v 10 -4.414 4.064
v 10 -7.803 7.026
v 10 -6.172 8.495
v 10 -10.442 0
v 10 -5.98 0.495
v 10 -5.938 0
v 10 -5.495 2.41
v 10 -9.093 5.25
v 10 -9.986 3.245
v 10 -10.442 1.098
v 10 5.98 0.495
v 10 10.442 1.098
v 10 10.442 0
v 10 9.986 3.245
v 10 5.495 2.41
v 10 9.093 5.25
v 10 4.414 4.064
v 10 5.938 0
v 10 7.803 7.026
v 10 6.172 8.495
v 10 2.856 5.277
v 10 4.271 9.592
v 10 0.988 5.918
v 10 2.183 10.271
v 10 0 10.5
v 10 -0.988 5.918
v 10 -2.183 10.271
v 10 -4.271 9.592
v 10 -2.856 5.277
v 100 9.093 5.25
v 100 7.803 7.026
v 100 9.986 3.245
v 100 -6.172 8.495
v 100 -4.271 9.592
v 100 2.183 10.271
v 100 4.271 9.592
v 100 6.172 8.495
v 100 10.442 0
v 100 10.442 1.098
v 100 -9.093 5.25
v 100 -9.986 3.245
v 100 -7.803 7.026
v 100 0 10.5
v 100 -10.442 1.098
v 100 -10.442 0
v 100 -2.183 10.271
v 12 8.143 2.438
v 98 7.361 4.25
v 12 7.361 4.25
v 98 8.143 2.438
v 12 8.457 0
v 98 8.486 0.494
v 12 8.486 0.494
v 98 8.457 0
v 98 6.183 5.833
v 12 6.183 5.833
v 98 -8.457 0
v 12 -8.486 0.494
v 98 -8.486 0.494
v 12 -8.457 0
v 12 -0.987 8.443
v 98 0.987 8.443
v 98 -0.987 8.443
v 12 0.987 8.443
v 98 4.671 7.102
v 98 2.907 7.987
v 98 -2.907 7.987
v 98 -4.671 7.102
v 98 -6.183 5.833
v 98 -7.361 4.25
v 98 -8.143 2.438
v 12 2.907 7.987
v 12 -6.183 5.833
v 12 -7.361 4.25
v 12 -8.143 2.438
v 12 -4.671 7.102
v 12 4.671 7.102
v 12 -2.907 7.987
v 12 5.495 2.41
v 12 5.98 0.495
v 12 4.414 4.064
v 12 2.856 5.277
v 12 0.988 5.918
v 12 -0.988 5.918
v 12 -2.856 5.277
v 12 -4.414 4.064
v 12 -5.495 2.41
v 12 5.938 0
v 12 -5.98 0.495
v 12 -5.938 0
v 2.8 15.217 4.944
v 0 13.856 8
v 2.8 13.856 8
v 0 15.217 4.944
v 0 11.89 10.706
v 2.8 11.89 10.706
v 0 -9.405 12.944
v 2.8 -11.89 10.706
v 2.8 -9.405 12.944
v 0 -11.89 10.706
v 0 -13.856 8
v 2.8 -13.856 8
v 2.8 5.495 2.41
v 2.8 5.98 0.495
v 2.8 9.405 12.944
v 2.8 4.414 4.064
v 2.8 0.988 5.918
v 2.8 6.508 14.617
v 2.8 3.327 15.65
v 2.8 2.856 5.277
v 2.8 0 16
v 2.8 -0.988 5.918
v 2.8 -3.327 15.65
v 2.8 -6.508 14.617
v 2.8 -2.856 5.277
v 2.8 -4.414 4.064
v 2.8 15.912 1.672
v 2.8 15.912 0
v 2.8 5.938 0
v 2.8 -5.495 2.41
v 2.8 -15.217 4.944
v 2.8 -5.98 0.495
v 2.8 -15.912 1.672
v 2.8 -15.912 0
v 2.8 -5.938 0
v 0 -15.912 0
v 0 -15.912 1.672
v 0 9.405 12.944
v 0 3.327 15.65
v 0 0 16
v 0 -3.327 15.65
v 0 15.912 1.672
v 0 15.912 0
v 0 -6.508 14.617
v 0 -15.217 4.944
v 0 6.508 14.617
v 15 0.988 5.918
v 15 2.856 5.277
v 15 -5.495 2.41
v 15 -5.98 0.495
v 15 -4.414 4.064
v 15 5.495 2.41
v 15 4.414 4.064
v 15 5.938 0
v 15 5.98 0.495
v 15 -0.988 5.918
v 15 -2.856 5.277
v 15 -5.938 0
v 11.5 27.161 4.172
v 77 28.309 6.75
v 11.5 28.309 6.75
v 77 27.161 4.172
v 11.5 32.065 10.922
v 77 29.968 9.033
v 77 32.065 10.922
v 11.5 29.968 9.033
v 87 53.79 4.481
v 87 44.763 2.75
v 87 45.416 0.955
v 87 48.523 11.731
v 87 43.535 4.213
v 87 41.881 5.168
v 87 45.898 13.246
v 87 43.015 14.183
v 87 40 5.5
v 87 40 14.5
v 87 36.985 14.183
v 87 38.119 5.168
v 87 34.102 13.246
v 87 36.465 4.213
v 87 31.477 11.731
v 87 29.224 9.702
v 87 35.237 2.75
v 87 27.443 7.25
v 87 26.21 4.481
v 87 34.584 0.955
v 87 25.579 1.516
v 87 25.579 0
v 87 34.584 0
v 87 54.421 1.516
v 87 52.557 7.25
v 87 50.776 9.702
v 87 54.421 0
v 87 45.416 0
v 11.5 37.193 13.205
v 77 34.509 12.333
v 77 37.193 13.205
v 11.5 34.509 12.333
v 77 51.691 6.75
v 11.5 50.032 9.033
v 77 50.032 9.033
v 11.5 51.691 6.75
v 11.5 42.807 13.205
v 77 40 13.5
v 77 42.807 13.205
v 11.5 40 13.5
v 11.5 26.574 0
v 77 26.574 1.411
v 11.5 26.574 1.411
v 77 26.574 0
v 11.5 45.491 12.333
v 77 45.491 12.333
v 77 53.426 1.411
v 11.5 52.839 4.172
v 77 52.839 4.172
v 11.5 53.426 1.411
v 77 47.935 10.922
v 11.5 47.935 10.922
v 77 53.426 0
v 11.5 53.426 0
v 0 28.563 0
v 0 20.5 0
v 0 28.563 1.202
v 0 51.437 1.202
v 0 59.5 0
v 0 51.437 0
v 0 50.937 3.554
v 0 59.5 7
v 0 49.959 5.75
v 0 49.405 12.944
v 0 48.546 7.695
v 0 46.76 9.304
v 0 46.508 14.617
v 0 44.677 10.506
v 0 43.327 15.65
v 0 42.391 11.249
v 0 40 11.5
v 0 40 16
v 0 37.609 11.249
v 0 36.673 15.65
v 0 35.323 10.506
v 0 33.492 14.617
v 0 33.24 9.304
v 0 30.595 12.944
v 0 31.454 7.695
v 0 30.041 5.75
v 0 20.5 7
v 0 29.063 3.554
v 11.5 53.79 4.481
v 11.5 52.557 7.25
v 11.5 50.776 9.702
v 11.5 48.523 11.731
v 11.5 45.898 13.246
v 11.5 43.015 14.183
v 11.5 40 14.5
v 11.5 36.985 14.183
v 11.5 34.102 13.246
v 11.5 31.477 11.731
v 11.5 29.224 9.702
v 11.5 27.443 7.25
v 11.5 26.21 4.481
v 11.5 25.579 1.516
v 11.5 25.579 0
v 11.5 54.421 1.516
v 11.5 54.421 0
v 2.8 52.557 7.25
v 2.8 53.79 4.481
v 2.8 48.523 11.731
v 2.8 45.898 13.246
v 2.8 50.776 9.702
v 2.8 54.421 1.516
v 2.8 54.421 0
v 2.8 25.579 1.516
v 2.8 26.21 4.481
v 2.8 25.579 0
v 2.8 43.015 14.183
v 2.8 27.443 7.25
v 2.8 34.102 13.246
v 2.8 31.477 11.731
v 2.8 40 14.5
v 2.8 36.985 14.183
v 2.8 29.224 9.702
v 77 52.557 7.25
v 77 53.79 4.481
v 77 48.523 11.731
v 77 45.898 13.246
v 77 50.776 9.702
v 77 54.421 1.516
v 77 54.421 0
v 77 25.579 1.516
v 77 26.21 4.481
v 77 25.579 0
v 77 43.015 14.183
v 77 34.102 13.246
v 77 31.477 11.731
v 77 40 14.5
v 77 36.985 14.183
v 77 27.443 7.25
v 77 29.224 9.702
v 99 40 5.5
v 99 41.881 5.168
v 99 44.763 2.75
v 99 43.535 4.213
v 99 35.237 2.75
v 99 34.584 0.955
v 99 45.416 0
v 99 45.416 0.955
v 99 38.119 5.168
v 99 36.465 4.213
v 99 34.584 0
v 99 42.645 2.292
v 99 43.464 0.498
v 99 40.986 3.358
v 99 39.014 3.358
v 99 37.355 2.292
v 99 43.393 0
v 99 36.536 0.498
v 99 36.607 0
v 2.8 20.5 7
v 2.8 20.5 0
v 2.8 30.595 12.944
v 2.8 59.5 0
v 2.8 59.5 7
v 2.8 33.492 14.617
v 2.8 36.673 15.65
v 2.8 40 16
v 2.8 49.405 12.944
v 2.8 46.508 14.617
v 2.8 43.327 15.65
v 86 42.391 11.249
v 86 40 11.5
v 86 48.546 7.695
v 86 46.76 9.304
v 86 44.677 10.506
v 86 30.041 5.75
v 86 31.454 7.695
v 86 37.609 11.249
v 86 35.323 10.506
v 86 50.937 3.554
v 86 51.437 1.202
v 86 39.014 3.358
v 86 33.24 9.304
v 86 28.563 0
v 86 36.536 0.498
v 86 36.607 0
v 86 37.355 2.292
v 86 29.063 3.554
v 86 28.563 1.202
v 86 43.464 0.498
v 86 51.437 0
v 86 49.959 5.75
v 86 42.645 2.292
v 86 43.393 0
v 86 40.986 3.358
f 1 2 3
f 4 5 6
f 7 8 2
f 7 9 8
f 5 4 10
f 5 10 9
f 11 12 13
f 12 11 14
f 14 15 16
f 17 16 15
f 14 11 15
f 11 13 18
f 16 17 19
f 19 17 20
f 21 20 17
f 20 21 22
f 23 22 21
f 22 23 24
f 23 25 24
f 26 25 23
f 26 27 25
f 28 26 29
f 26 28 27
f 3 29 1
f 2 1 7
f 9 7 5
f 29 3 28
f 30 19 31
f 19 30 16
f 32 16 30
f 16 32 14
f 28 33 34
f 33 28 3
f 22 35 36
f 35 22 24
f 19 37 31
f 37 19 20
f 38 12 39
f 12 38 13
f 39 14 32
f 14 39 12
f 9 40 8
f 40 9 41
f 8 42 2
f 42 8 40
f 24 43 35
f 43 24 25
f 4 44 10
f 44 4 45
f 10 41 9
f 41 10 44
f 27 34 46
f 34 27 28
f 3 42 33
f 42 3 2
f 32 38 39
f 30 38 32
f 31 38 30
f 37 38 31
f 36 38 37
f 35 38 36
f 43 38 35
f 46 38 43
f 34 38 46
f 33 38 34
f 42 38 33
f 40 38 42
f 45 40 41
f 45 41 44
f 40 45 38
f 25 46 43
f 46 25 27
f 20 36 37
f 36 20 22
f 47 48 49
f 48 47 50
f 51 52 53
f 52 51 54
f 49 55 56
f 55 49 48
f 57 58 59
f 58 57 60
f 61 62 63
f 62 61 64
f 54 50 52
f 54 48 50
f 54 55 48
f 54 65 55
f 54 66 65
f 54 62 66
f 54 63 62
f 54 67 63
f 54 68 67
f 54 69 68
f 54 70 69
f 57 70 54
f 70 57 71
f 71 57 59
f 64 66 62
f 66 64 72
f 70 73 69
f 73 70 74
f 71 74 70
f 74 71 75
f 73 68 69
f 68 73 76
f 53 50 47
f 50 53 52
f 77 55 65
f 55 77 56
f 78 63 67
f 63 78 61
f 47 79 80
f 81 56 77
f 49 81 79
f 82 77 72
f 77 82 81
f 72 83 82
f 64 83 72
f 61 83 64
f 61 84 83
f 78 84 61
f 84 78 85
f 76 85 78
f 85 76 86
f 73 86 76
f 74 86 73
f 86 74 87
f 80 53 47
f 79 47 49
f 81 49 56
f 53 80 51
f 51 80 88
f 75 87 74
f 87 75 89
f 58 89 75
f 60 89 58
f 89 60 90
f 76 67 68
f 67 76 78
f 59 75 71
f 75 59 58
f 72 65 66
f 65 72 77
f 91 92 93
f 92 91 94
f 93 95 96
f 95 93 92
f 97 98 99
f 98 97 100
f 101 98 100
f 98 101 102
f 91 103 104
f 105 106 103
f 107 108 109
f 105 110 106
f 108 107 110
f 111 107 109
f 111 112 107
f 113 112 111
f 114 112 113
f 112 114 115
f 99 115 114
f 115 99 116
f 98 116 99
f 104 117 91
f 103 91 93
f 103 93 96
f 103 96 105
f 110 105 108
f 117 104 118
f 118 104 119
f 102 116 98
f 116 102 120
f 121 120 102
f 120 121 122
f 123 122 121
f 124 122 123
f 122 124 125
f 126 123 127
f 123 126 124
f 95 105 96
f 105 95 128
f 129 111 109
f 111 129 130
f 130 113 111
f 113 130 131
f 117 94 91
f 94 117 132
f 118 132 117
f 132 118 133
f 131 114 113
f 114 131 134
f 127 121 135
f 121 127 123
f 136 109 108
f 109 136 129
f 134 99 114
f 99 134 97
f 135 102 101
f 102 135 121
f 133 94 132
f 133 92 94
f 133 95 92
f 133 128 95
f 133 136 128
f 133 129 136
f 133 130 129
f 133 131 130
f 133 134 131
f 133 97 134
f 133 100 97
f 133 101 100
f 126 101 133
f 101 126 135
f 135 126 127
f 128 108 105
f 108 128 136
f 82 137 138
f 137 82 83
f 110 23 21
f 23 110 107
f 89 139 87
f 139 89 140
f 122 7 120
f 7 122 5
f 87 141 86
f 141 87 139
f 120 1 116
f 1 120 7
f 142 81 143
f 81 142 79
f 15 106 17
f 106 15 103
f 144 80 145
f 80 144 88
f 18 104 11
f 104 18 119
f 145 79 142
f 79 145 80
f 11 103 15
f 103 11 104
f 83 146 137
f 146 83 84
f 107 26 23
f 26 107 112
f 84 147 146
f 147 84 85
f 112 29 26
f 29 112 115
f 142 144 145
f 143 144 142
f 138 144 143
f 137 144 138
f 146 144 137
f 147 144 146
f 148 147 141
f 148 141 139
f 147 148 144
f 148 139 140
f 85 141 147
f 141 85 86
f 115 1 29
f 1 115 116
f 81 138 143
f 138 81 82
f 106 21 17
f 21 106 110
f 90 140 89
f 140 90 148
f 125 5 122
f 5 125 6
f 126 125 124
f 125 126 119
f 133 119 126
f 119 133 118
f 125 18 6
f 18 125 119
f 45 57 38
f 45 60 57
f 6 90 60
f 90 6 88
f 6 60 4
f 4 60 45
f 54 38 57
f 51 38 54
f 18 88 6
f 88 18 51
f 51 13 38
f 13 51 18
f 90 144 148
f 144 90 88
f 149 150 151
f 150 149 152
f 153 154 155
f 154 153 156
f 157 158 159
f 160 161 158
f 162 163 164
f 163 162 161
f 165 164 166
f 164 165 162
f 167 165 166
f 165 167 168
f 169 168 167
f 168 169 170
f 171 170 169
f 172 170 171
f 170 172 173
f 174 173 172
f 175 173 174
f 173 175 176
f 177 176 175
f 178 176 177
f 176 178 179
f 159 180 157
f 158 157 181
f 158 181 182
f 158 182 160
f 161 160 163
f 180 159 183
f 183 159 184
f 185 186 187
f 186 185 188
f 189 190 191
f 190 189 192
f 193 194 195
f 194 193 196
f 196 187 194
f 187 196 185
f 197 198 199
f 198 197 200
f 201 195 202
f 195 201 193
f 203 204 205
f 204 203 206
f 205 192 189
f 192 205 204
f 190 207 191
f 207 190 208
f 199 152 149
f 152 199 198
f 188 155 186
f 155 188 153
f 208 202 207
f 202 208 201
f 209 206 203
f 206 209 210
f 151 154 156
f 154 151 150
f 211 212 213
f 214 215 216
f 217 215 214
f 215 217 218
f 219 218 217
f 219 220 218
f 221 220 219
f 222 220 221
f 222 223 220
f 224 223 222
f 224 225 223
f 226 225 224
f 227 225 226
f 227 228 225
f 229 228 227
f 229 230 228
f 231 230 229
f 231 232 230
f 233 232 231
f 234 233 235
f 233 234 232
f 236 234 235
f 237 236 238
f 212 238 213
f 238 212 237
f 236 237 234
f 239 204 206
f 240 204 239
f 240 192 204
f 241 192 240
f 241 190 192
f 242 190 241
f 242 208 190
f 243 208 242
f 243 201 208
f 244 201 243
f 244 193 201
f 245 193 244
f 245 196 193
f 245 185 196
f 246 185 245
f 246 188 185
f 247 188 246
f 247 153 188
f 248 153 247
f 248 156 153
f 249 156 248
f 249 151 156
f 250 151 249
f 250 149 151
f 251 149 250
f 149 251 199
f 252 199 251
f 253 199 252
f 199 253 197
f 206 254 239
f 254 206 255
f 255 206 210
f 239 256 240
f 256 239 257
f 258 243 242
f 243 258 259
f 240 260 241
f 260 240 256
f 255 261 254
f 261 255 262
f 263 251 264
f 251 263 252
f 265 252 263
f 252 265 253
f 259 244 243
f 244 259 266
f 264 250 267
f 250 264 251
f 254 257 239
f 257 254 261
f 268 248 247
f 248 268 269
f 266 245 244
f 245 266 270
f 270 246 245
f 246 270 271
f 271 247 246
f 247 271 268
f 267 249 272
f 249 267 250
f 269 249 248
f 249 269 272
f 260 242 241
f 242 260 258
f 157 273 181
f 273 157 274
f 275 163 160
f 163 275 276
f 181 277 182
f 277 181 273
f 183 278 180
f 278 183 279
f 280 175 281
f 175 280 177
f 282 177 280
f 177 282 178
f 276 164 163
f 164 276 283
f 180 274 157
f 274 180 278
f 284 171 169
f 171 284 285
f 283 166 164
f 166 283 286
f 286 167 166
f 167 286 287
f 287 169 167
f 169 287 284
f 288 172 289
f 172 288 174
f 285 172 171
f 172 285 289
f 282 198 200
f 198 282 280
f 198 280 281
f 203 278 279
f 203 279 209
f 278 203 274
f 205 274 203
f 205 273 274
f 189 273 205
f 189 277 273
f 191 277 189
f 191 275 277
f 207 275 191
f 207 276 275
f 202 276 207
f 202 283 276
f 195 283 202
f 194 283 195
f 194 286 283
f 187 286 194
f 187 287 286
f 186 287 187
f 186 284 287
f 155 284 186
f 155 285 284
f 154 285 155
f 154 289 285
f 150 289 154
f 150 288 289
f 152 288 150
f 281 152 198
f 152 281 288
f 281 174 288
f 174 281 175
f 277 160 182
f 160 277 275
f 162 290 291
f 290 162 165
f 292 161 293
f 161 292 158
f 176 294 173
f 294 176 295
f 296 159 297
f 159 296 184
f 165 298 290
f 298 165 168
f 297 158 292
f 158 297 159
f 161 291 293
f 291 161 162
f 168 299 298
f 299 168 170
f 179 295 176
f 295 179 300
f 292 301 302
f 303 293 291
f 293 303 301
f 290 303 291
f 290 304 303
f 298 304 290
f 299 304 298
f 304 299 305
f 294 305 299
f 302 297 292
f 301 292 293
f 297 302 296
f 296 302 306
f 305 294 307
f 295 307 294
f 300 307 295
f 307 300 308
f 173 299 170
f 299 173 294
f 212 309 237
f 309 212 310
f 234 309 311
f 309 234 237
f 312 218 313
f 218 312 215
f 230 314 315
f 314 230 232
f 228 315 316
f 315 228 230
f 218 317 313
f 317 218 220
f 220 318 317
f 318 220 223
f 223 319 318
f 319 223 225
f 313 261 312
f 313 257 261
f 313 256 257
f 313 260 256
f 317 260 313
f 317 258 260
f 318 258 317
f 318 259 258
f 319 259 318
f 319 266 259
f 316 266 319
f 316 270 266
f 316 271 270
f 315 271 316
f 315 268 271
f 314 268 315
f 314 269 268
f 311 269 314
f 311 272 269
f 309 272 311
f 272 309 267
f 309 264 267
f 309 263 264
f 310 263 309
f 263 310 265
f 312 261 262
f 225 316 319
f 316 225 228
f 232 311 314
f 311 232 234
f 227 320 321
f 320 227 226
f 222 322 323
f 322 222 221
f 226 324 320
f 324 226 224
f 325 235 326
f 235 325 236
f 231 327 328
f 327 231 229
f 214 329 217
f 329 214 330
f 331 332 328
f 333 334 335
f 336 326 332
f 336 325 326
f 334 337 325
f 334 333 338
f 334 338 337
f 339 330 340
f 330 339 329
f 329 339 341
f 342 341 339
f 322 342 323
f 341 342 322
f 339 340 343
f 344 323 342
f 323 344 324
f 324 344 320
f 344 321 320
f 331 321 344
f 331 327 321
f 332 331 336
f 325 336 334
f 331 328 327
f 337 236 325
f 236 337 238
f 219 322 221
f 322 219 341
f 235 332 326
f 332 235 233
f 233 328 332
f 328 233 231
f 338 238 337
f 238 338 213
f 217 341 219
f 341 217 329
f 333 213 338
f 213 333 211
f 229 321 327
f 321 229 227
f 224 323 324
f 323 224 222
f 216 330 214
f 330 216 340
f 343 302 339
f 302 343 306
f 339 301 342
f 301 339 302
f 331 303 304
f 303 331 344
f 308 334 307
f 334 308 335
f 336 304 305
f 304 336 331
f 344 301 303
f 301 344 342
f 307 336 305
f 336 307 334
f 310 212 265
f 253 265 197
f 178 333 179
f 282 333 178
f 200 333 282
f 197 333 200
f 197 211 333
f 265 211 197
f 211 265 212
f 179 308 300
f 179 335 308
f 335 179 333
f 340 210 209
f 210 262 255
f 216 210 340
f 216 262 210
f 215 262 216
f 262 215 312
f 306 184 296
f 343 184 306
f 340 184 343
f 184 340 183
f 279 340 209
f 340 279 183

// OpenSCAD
// Corps
log = 87;
rco = 27/2;

// Base
bax = 32/2;
bay = 39/2;
ep = 2.8;


module corps() difference(){
	
	union(){
		// corps
		cylinder(r=rco, h=log); 
		cylinder(r=rco+1, h=11.5); // bague base
		translate([0,0,log-10]) cylinder(r=rco+1, h=10); // bague tete
		translate([0,0,log]) cylinder(r=11/2, h=12); 

		// base
		hull(){
			translate([-7,-bay,0]) cube([14,3,ep]);
			translate([-7,bay-3,0]) cube([14,3,ep]);
			cylinder(r=bax, h=ep); 
		}
	}
	
	// vide
	translate([0,0,-1]) cylinder(r=rco-2, h=log);
	translate([0,0,log-2]) cylinder(r=11/2-2, h=20);
}

// pist
rpou = 32/2;
rpis = rco-3;
lpis = 100;

module pist(){
	
	cylinder(r=rpou, h=ep);
	cylinder(r=12/2, h=15);
	difference(){
		translate([0,0,10]) cylinder(r=rpis, h=lpis-10);
		translate([0,0,12]) cylinder(r=rpis-2, h=lpis-14);
	}
	
}

difference() {
	rotate([0,90,0]) pist();
	translate([-50,-50,-50]) cube([200,120,50]);
}

translate([0,40,0]) difference() {
	rotate([0,90,0]) corps();
	translate([-50,-50,-50]) cube([200,120,50]);
}

/*
translate([0,40*2,0]) difference() {
	rotate([0,90,0]) pist();
	translate([-50,-50,-50]) cube([200,120,50]);
}

translate([0,40*3,0]) difference() {
	rotate([0,90,0]) corps();
	translate([-50,-50,-50]) cube([200,120,50]);
}
*/
